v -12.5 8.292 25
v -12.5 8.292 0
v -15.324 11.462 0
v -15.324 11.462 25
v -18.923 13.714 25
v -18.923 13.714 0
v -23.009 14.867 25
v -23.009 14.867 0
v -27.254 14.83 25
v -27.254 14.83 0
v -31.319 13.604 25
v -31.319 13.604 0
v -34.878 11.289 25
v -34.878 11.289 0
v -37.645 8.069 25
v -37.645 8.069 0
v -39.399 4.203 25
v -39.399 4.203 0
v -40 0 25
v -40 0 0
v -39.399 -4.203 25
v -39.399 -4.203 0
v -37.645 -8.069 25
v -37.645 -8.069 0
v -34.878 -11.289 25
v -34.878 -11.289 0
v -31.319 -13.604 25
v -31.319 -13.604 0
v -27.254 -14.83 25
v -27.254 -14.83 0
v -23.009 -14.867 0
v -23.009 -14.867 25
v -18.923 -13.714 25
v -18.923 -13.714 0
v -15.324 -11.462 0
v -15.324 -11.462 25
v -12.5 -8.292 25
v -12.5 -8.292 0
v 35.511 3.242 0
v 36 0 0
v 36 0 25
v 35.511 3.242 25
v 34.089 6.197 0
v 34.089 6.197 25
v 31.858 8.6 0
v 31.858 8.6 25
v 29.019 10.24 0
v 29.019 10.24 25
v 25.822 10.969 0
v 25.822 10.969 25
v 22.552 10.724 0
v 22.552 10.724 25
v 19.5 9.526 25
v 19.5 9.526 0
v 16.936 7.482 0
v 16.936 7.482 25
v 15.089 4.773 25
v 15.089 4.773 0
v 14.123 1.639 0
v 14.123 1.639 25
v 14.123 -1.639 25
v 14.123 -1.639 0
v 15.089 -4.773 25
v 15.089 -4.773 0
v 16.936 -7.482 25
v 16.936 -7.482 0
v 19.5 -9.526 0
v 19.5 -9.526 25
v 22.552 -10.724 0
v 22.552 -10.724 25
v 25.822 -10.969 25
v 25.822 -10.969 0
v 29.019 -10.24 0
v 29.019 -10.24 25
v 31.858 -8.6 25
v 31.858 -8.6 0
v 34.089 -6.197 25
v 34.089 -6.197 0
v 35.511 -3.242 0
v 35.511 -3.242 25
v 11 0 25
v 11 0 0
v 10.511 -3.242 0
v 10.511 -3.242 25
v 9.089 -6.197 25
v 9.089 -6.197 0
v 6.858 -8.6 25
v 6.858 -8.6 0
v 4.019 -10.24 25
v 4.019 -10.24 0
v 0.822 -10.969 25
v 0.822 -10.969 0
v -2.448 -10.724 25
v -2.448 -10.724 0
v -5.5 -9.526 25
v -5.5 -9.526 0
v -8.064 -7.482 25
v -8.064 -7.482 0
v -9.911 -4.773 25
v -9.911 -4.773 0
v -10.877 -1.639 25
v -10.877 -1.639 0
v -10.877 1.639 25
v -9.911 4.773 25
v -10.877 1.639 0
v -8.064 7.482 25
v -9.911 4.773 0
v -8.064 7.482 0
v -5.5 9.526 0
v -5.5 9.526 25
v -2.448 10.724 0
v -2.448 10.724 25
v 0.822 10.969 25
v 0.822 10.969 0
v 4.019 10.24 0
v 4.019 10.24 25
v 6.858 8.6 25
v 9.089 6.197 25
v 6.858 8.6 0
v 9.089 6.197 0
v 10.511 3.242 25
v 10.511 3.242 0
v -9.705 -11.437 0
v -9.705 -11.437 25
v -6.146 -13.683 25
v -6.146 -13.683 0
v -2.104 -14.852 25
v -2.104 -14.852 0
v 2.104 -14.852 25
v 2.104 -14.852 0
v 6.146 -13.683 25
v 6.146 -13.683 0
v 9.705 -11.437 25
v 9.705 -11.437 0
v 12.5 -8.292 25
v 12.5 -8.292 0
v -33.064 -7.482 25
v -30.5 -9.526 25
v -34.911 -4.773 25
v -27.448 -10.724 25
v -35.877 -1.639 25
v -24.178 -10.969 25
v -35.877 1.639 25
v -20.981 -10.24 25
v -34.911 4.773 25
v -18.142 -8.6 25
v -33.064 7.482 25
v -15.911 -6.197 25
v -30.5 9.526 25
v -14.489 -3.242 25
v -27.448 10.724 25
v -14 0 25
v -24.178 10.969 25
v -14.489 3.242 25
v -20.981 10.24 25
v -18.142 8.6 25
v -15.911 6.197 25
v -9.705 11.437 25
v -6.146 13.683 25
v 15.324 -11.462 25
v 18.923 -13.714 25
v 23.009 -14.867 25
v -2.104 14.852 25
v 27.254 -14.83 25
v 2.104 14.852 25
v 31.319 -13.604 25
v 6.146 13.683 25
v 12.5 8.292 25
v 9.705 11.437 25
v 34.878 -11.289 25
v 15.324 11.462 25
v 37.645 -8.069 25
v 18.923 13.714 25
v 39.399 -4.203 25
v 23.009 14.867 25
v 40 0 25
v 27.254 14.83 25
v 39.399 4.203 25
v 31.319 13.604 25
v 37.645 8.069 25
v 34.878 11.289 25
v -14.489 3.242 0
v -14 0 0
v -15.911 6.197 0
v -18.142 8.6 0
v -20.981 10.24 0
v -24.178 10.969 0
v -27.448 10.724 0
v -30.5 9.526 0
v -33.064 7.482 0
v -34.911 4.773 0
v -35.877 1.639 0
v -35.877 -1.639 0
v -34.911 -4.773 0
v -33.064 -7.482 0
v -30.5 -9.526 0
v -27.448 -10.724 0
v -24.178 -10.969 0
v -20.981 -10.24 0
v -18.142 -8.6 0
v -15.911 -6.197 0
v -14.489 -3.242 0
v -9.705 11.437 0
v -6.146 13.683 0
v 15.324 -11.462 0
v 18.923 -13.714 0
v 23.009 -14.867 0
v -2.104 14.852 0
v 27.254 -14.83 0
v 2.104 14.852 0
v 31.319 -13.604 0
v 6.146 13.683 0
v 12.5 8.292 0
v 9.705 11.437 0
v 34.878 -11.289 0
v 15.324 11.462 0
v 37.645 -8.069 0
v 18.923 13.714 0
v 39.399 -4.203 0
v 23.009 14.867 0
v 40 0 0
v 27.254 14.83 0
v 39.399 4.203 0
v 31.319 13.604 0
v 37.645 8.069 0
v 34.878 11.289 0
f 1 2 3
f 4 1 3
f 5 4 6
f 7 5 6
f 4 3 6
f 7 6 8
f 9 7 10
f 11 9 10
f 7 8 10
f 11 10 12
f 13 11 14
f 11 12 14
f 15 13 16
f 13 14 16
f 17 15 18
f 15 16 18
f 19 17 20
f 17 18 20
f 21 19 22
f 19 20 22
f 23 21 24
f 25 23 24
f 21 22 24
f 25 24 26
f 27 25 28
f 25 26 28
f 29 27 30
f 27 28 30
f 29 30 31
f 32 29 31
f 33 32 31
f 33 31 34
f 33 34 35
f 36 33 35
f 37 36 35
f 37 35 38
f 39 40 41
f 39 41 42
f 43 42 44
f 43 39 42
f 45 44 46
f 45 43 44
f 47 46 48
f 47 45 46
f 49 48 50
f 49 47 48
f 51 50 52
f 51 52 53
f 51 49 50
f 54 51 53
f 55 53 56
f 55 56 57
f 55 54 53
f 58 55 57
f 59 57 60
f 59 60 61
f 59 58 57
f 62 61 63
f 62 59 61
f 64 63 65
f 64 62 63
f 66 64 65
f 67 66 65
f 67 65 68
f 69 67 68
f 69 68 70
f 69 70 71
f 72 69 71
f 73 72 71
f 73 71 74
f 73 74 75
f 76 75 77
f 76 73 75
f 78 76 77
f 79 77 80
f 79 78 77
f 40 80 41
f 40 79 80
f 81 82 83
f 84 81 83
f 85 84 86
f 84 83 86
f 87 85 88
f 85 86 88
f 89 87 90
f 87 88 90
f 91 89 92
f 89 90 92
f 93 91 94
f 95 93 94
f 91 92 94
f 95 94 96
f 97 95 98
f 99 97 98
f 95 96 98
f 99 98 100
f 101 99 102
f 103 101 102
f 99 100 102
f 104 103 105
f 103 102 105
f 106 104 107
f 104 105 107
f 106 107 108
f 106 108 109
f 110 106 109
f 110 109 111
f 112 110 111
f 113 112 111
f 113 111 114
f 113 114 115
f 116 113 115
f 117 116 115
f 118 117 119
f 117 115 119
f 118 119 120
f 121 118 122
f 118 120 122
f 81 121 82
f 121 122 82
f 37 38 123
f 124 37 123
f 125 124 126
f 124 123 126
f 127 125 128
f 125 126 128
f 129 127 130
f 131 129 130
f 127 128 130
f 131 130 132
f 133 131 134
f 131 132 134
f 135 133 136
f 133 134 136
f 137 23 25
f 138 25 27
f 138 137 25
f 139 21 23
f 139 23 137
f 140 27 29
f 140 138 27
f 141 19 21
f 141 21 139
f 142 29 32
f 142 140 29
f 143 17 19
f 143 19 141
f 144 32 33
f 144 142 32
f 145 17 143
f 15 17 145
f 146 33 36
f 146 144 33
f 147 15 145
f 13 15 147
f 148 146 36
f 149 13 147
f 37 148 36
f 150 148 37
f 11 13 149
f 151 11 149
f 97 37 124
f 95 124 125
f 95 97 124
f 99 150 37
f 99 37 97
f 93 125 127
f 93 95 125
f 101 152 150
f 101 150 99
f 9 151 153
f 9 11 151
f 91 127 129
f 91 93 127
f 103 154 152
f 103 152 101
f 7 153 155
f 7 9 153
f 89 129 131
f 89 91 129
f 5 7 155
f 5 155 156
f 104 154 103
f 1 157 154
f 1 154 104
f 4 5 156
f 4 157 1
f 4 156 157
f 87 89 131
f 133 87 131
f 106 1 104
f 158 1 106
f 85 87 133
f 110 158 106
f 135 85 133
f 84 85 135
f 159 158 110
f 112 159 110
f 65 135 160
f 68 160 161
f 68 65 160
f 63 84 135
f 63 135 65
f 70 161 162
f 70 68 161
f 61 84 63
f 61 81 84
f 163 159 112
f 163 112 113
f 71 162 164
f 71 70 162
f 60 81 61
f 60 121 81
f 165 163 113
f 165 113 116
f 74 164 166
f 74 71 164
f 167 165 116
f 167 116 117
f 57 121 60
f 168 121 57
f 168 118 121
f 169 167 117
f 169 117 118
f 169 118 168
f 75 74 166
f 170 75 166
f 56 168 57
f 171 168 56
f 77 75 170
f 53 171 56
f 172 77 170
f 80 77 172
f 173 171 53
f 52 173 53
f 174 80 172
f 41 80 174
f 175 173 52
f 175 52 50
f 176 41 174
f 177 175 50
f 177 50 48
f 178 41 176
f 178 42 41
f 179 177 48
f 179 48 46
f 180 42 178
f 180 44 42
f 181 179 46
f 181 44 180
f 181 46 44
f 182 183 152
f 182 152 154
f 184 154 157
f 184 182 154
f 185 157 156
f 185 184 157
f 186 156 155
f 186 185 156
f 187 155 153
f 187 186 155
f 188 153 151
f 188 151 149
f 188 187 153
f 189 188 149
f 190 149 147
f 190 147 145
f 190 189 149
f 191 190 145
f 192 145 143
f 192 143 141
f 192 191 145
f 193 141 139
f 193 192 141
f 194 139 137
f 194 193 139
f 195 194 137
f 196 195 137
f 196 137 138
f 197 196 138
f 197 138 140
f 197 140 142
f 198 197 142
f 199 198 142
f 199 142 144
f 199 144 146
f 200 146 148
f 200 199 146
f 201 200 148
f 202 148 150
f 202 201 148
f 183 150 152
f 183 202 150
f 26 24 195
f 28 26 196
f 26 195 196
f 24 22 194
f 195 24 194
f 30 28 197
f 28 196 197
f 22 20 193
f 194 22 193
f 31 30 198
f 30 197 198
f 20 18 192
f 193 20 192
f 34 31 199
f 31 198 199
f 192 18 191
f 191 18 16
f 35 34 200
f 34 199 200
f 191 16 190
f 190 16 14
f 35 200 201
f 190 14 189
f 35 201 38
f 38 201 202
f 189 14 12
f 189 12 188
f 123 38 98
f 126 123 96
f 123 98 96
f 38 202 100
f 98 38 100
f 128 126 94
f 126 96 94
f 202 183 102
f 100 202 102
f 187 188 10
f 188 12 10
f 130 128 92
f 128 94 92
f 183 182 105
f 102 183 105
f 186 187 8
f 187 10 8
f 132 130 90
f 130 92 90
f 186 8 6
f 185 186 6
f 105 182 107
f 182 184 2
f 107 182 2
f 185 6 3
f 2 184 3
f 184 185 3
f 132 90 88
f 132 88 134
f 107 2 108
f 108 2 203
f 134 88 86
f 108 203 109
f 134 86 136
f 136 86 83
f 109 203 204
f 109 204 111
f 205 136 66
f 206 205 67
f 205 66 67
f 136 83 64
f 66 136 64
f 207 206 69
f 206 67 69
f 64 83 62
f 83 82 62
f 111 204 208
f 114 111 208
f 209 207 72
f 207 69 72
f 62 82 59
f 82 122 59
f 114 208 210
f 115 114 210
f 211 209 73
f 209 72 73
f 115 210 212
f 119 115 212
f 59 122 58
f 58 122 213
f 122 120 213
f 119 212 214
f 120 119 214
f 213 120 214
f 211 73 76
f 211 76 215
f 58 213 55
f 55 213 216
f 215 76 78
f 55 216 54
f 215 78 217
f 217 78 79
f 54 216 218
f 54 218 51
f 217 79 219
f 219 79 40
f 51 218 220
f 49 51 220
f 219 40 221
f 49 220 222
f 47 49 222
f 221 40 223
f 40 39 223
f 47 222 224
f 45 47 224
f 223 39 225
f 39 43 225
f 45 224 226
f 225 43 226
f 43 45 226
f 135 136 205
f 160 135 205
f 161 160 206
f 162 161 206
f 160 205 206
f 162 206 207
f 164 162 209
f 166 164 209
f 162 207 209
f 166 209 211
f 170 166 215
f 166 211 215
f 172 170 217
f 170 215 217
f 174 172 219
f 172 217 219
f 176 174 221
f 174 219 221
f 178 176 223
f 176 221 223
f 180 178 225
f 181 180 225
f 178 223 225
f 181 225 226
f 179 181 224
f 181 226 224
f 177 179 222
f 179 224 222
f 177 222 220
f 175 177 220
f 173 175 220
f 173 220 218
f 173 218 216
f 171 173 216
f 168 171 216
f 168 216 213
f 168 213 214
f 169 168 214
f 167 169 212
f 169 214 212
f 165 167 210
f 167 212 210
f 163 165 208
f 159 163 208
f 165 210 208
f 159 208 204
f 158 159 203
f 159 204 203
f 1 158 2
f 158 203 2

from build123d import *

# Parameters (mm, degrees)
F0_R     = 11
F1_DEPTH = 25


with BuildPart() as f1:
    # F0 (on Top) → F1 (new body)
    with BuildSketch(Plane.XY):
        with BuildLine():
            ThreePointArc((-12.5, 8.291562), (-40, 0), (-12.5, -8.291562))
            ThreePointArc((-12.5, -8.291562), (0, -15), (12.5, -8.291562))
            ThreePointArc((12.5, -8.291562), (40, 0), (12.5, 8.291562))
            ThreePointArc((12.5, 8.291562), (0, 15), (-12.5, 8.291562))
        make_face()
        with Locations((-25, 0)):
            Circle(F0_R, mode=Mode.SUBTRACT)
        with BuildLine():
            ThreePointArc((-11, 0), (0, 11), (11, 0))
            ThreePointArc((11, 0), (0, -11), (-11, 0))
        make_face(mode=Mode.SUBTRACT)
        with Locations((25, 0)):
            Circle(F0_R, mode=Mode.SUBTRACT)
    extrude(amount=F1_DEPTH)


solid = f1.part
